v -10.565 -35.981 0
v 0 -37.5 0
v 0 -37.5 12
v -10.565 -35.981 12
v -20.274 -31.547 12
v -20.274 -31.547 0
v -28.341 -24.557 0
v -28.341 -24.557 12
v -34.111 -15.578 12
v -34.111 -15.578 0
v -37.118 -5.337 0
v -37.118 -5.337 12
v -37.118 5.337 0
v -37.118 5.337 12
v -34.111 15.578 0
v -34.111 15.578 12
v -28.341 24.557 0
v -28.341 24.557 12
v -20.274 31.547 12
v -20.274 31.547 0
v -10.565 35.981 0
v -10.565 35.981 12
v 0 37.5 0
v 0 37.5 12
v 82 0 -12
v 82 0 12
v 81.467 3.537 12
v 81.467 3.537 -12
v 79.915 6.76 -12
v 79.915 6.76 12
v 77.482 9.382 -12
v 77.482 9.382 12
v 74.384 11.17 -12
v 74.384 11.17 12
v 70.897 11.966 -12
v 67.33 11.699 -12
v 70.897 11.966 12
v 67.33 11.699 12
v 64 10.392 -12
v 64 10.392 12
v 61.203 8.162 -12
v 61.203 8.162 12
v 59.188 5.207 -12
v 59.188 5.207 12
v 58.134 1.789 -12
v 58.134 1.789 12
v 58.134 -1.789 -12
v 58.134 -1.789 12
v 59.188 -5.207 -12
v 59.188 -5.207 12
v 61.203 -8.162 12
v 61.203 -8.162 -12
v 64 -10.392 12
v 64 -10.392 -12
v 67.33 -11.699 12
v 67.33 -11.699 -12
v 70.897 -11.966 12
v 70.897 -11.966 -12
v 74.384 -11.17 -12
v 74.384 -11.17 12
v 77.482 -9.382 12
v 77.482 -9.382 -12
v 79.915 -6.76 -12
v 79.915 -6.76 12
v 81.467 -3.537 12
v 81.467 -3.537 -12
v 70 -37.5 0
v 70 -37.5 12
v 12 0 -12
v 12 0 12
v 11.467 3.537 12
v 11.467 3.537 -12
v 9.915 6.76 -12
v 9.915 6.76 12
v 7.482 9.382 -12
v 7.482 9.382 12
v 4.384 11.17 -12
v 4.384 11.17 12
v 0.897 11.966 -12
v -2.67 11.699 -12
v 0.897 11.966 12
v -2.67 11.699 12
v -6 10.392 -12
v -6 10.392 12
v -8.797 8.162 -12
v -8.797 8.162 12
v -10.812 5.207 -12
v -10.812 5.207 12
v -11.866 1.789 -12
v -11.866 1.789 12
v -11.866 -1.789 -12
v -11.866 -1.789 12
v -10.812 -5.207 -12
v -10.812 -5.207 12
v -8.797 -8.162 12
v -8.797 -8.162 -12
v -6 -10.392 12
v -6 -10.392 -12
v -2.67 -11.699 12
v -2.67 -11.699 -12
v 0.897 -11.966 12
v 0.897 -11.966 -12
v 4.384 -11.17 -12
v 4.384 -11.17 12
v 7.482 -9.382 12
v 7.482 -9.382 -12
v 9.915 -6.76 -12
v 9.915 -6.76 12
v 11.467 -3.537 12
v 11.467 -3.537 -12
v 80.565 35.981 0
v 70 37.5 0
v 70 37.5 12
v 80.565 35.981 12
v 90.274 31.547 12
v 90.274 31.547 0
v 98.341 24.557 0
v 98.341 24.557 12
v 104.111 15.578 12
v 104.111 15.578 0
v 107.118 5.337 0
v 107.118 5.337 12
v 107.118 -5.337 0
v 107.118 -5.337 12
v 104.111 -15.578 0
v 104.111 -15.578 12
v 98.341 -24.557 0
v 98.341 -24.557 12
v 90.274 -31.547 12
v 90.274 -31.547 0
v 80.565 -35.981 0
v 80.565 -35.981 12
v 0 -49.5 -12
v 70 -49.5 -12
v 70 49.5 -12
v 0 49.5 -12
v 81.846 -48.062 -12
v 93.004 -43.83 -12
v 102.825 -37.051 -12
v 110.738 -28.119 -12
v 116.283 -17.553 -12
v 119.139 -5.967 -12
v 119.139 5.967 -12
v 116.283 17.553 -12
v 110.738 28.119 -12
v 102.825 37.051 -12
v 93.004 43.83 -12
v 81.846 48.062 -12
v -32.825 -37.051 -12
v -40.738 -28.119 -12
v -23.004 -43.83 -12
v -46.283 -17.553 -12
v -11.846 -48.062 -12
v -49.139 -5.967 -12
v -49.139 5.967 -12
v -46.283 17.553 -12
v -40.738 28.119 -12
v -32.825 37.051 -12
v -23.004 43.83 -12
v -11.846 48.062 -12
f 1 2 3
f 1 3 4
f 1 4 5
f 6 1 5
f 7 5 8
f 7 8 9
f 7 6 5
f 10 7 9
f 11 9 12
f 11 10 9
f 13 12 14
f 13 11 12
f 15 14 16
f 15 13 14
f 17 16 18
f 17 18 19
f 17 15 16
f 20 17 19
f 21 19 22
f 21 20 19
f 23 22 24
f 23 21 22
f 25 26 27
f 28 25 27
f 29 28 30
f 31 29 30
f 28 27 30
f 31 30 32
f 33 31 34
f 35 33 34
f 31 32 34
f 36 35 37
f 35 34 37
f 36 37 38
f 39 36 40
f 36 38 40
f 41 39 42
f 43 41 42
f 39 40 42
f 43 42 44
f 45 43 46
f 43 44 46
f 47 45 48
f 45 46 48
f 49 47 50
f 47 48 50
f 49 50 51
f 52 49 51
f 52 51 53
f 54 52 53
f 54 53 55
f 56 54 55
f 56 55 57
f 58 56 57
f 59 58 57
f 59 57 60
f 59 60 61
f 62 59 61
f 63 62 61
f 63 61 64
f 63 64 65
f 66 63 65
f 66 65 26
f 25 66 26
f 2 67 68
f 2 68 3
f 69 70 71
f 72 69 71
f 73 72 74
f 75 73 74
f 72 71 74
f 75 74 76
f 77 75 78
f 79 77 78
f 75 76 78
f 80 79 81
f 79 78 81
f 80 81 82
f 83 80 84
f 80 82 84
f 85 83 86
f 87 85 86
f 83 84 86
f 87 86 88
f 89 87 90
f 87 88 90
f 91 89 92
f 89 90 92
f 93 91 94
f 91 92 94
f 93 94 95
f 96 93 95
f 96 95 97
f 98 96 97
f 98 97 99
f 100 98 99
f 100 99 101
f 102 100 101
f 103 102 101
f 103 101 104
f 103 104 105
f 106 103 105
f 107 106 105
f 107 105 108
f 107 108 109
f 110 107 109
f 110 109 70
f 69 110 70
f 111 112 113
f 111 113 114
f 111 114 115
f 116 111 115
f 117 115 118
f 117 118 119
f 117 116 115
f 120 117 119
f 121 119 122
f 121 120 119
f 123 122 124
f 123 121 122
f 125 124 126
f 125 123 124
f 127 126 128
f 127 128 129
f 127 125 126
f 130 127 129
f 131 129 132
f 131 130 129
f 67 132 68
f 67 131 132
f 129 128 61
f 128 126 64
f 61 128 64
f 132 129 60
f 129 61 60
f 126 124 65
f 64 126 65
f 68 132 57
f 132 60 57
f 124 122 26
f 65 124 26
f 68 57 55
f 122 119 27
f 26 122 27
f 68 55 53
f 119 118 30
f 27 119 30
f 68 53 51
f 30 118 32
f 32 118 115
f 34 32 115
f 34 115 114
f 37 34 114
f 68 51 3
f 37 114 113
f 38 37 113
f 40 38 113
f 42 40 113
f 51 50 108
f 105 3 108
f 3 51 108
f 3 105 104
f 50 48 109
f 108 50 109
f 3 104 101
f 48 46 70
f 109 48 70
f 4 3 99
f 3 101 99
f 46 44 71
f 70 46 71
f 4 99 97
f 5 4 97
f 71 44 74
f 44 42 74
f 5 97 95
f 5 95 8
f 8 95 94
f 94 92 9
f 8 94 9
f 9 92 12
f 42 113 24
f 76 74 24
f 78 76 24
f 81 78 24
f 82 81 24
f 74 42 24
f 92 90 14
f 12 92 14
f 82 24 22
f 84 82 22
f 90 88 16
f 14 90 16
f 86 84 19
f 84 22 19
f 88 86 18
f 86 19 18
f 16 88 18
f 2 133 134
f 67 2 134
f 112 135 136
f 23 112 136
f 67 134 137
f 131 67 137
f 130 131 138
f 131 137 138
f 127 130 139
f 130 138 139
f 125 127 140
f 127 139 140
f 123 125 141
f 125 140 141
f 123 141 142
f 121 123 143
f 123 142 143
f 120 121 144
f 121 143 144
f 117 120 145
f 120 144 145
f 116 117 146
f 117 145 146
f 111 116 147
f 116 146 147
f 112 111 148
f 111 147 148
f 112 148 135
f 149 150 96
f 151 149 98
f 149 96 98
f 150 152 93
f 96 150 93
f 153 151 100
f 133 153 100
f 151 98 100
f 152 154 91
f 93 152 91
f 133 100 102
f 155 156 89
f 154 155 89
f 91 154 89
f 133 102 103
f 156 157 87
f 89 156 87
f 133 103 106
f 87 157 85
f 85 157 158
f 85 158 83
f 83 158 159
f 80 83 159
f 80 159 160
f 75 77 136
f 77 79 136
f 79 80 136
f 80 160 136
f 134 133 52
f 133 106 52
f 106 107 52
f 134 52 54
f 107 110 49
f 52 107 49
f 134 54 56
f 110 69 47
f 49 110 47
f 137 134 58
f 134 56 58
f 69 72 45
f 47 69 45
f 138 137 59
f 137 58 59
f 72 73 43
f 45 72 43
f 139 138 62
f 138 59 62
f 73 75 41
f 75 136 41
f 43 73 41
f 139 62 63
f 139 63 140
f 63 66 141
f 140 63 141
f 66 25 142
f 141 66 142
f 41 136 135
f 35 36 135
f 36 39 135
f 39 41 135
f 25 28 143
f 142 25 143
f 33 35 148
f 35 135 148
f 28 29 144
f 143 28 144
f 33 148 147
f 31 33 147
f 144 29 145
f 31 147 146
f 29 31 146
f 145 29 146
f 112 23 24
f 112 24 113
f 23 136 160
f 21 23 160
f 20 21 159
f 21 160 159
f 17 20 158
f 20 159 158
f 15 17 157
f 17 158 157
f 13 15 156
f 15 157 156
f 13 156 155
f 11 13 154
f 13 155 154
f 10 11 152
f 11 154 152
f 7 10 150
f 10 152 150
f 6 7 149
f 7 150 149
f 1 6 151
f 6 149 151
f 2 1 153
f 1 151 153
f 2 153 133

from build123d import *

# Parameters (mm, degrees)
BOSS_EXTRUDE1_DEPTH = 12
BOSS_EXTRUDE2_DEPTH = 12
CHAMFER1_SIZE       = 12
SKETCH3_R           = 12
CUT_EXTRUDE1_DEPTH  = 132.554171352


with BuildPart() as part:
    # Sketch1 → Boss-Extrude1 (new body)
    with BuildSketch(Plane.XY):
        with BuildLine():
            Line((0, 37.5), (70, 37.5))
            ThreePointArc((70, 37.5), (107.5, 0), (70, -37.5))
            Line((70, -37.5), (0, -37.5))
            ThreePointArc((0, -37.5), (-37.5, 0), (0, 37.5))
        make_face()
    extrude(amount=BOSS_EXTRUDE1_DEPTH)

    # Sketch2 → Boss-Extrude2 (add)
    with BuildSketch(Plane(origin=(0, 0, 0), x_dir=(-1, 0, 0), z_dir=(0, 0, -1))):
        with BuildLine():
            Line((0, -49.5), (-70, -49.5))
            ThreePointArc((-70, -49.5), (-119.5, 0), (-70, 49.5))
            Line((-70, 49.5), (0, 49.5))
            ThreePointArc((0, 49.5), (49.5, 0), (0, -49.5))
        make_face()
    extrude(amount=BOSS_EXTRUDE2_DEPTH)

    # Chamfer1
    chamfer1_edges = [part.edges().sort_by_distance(p)[0] for p in [
        (35, 49.5, 0),
        (119.5, 0, 0),
        (35, -49.5, 0),
        (-49.5, 0, 0),
    ]]
    chamfer(chamfer1_edges, length=CHAMFER1_SIZE - 0.0001)  # a hair under: the kernel refuses the full size

    # Sketch3 → Cut-Extrude1 (cut, through all)
    with BuildSketch(Plane.XY.offset(12)):
        Circle(SKETCH3_R)
        with Locations((70, 0)):
            Circle(SKETCH3_R)
    extrude(amount=-CUT_EXTRUDE1_DEPTH, mode=Mode.SUBTRACT)


solid = part.part
